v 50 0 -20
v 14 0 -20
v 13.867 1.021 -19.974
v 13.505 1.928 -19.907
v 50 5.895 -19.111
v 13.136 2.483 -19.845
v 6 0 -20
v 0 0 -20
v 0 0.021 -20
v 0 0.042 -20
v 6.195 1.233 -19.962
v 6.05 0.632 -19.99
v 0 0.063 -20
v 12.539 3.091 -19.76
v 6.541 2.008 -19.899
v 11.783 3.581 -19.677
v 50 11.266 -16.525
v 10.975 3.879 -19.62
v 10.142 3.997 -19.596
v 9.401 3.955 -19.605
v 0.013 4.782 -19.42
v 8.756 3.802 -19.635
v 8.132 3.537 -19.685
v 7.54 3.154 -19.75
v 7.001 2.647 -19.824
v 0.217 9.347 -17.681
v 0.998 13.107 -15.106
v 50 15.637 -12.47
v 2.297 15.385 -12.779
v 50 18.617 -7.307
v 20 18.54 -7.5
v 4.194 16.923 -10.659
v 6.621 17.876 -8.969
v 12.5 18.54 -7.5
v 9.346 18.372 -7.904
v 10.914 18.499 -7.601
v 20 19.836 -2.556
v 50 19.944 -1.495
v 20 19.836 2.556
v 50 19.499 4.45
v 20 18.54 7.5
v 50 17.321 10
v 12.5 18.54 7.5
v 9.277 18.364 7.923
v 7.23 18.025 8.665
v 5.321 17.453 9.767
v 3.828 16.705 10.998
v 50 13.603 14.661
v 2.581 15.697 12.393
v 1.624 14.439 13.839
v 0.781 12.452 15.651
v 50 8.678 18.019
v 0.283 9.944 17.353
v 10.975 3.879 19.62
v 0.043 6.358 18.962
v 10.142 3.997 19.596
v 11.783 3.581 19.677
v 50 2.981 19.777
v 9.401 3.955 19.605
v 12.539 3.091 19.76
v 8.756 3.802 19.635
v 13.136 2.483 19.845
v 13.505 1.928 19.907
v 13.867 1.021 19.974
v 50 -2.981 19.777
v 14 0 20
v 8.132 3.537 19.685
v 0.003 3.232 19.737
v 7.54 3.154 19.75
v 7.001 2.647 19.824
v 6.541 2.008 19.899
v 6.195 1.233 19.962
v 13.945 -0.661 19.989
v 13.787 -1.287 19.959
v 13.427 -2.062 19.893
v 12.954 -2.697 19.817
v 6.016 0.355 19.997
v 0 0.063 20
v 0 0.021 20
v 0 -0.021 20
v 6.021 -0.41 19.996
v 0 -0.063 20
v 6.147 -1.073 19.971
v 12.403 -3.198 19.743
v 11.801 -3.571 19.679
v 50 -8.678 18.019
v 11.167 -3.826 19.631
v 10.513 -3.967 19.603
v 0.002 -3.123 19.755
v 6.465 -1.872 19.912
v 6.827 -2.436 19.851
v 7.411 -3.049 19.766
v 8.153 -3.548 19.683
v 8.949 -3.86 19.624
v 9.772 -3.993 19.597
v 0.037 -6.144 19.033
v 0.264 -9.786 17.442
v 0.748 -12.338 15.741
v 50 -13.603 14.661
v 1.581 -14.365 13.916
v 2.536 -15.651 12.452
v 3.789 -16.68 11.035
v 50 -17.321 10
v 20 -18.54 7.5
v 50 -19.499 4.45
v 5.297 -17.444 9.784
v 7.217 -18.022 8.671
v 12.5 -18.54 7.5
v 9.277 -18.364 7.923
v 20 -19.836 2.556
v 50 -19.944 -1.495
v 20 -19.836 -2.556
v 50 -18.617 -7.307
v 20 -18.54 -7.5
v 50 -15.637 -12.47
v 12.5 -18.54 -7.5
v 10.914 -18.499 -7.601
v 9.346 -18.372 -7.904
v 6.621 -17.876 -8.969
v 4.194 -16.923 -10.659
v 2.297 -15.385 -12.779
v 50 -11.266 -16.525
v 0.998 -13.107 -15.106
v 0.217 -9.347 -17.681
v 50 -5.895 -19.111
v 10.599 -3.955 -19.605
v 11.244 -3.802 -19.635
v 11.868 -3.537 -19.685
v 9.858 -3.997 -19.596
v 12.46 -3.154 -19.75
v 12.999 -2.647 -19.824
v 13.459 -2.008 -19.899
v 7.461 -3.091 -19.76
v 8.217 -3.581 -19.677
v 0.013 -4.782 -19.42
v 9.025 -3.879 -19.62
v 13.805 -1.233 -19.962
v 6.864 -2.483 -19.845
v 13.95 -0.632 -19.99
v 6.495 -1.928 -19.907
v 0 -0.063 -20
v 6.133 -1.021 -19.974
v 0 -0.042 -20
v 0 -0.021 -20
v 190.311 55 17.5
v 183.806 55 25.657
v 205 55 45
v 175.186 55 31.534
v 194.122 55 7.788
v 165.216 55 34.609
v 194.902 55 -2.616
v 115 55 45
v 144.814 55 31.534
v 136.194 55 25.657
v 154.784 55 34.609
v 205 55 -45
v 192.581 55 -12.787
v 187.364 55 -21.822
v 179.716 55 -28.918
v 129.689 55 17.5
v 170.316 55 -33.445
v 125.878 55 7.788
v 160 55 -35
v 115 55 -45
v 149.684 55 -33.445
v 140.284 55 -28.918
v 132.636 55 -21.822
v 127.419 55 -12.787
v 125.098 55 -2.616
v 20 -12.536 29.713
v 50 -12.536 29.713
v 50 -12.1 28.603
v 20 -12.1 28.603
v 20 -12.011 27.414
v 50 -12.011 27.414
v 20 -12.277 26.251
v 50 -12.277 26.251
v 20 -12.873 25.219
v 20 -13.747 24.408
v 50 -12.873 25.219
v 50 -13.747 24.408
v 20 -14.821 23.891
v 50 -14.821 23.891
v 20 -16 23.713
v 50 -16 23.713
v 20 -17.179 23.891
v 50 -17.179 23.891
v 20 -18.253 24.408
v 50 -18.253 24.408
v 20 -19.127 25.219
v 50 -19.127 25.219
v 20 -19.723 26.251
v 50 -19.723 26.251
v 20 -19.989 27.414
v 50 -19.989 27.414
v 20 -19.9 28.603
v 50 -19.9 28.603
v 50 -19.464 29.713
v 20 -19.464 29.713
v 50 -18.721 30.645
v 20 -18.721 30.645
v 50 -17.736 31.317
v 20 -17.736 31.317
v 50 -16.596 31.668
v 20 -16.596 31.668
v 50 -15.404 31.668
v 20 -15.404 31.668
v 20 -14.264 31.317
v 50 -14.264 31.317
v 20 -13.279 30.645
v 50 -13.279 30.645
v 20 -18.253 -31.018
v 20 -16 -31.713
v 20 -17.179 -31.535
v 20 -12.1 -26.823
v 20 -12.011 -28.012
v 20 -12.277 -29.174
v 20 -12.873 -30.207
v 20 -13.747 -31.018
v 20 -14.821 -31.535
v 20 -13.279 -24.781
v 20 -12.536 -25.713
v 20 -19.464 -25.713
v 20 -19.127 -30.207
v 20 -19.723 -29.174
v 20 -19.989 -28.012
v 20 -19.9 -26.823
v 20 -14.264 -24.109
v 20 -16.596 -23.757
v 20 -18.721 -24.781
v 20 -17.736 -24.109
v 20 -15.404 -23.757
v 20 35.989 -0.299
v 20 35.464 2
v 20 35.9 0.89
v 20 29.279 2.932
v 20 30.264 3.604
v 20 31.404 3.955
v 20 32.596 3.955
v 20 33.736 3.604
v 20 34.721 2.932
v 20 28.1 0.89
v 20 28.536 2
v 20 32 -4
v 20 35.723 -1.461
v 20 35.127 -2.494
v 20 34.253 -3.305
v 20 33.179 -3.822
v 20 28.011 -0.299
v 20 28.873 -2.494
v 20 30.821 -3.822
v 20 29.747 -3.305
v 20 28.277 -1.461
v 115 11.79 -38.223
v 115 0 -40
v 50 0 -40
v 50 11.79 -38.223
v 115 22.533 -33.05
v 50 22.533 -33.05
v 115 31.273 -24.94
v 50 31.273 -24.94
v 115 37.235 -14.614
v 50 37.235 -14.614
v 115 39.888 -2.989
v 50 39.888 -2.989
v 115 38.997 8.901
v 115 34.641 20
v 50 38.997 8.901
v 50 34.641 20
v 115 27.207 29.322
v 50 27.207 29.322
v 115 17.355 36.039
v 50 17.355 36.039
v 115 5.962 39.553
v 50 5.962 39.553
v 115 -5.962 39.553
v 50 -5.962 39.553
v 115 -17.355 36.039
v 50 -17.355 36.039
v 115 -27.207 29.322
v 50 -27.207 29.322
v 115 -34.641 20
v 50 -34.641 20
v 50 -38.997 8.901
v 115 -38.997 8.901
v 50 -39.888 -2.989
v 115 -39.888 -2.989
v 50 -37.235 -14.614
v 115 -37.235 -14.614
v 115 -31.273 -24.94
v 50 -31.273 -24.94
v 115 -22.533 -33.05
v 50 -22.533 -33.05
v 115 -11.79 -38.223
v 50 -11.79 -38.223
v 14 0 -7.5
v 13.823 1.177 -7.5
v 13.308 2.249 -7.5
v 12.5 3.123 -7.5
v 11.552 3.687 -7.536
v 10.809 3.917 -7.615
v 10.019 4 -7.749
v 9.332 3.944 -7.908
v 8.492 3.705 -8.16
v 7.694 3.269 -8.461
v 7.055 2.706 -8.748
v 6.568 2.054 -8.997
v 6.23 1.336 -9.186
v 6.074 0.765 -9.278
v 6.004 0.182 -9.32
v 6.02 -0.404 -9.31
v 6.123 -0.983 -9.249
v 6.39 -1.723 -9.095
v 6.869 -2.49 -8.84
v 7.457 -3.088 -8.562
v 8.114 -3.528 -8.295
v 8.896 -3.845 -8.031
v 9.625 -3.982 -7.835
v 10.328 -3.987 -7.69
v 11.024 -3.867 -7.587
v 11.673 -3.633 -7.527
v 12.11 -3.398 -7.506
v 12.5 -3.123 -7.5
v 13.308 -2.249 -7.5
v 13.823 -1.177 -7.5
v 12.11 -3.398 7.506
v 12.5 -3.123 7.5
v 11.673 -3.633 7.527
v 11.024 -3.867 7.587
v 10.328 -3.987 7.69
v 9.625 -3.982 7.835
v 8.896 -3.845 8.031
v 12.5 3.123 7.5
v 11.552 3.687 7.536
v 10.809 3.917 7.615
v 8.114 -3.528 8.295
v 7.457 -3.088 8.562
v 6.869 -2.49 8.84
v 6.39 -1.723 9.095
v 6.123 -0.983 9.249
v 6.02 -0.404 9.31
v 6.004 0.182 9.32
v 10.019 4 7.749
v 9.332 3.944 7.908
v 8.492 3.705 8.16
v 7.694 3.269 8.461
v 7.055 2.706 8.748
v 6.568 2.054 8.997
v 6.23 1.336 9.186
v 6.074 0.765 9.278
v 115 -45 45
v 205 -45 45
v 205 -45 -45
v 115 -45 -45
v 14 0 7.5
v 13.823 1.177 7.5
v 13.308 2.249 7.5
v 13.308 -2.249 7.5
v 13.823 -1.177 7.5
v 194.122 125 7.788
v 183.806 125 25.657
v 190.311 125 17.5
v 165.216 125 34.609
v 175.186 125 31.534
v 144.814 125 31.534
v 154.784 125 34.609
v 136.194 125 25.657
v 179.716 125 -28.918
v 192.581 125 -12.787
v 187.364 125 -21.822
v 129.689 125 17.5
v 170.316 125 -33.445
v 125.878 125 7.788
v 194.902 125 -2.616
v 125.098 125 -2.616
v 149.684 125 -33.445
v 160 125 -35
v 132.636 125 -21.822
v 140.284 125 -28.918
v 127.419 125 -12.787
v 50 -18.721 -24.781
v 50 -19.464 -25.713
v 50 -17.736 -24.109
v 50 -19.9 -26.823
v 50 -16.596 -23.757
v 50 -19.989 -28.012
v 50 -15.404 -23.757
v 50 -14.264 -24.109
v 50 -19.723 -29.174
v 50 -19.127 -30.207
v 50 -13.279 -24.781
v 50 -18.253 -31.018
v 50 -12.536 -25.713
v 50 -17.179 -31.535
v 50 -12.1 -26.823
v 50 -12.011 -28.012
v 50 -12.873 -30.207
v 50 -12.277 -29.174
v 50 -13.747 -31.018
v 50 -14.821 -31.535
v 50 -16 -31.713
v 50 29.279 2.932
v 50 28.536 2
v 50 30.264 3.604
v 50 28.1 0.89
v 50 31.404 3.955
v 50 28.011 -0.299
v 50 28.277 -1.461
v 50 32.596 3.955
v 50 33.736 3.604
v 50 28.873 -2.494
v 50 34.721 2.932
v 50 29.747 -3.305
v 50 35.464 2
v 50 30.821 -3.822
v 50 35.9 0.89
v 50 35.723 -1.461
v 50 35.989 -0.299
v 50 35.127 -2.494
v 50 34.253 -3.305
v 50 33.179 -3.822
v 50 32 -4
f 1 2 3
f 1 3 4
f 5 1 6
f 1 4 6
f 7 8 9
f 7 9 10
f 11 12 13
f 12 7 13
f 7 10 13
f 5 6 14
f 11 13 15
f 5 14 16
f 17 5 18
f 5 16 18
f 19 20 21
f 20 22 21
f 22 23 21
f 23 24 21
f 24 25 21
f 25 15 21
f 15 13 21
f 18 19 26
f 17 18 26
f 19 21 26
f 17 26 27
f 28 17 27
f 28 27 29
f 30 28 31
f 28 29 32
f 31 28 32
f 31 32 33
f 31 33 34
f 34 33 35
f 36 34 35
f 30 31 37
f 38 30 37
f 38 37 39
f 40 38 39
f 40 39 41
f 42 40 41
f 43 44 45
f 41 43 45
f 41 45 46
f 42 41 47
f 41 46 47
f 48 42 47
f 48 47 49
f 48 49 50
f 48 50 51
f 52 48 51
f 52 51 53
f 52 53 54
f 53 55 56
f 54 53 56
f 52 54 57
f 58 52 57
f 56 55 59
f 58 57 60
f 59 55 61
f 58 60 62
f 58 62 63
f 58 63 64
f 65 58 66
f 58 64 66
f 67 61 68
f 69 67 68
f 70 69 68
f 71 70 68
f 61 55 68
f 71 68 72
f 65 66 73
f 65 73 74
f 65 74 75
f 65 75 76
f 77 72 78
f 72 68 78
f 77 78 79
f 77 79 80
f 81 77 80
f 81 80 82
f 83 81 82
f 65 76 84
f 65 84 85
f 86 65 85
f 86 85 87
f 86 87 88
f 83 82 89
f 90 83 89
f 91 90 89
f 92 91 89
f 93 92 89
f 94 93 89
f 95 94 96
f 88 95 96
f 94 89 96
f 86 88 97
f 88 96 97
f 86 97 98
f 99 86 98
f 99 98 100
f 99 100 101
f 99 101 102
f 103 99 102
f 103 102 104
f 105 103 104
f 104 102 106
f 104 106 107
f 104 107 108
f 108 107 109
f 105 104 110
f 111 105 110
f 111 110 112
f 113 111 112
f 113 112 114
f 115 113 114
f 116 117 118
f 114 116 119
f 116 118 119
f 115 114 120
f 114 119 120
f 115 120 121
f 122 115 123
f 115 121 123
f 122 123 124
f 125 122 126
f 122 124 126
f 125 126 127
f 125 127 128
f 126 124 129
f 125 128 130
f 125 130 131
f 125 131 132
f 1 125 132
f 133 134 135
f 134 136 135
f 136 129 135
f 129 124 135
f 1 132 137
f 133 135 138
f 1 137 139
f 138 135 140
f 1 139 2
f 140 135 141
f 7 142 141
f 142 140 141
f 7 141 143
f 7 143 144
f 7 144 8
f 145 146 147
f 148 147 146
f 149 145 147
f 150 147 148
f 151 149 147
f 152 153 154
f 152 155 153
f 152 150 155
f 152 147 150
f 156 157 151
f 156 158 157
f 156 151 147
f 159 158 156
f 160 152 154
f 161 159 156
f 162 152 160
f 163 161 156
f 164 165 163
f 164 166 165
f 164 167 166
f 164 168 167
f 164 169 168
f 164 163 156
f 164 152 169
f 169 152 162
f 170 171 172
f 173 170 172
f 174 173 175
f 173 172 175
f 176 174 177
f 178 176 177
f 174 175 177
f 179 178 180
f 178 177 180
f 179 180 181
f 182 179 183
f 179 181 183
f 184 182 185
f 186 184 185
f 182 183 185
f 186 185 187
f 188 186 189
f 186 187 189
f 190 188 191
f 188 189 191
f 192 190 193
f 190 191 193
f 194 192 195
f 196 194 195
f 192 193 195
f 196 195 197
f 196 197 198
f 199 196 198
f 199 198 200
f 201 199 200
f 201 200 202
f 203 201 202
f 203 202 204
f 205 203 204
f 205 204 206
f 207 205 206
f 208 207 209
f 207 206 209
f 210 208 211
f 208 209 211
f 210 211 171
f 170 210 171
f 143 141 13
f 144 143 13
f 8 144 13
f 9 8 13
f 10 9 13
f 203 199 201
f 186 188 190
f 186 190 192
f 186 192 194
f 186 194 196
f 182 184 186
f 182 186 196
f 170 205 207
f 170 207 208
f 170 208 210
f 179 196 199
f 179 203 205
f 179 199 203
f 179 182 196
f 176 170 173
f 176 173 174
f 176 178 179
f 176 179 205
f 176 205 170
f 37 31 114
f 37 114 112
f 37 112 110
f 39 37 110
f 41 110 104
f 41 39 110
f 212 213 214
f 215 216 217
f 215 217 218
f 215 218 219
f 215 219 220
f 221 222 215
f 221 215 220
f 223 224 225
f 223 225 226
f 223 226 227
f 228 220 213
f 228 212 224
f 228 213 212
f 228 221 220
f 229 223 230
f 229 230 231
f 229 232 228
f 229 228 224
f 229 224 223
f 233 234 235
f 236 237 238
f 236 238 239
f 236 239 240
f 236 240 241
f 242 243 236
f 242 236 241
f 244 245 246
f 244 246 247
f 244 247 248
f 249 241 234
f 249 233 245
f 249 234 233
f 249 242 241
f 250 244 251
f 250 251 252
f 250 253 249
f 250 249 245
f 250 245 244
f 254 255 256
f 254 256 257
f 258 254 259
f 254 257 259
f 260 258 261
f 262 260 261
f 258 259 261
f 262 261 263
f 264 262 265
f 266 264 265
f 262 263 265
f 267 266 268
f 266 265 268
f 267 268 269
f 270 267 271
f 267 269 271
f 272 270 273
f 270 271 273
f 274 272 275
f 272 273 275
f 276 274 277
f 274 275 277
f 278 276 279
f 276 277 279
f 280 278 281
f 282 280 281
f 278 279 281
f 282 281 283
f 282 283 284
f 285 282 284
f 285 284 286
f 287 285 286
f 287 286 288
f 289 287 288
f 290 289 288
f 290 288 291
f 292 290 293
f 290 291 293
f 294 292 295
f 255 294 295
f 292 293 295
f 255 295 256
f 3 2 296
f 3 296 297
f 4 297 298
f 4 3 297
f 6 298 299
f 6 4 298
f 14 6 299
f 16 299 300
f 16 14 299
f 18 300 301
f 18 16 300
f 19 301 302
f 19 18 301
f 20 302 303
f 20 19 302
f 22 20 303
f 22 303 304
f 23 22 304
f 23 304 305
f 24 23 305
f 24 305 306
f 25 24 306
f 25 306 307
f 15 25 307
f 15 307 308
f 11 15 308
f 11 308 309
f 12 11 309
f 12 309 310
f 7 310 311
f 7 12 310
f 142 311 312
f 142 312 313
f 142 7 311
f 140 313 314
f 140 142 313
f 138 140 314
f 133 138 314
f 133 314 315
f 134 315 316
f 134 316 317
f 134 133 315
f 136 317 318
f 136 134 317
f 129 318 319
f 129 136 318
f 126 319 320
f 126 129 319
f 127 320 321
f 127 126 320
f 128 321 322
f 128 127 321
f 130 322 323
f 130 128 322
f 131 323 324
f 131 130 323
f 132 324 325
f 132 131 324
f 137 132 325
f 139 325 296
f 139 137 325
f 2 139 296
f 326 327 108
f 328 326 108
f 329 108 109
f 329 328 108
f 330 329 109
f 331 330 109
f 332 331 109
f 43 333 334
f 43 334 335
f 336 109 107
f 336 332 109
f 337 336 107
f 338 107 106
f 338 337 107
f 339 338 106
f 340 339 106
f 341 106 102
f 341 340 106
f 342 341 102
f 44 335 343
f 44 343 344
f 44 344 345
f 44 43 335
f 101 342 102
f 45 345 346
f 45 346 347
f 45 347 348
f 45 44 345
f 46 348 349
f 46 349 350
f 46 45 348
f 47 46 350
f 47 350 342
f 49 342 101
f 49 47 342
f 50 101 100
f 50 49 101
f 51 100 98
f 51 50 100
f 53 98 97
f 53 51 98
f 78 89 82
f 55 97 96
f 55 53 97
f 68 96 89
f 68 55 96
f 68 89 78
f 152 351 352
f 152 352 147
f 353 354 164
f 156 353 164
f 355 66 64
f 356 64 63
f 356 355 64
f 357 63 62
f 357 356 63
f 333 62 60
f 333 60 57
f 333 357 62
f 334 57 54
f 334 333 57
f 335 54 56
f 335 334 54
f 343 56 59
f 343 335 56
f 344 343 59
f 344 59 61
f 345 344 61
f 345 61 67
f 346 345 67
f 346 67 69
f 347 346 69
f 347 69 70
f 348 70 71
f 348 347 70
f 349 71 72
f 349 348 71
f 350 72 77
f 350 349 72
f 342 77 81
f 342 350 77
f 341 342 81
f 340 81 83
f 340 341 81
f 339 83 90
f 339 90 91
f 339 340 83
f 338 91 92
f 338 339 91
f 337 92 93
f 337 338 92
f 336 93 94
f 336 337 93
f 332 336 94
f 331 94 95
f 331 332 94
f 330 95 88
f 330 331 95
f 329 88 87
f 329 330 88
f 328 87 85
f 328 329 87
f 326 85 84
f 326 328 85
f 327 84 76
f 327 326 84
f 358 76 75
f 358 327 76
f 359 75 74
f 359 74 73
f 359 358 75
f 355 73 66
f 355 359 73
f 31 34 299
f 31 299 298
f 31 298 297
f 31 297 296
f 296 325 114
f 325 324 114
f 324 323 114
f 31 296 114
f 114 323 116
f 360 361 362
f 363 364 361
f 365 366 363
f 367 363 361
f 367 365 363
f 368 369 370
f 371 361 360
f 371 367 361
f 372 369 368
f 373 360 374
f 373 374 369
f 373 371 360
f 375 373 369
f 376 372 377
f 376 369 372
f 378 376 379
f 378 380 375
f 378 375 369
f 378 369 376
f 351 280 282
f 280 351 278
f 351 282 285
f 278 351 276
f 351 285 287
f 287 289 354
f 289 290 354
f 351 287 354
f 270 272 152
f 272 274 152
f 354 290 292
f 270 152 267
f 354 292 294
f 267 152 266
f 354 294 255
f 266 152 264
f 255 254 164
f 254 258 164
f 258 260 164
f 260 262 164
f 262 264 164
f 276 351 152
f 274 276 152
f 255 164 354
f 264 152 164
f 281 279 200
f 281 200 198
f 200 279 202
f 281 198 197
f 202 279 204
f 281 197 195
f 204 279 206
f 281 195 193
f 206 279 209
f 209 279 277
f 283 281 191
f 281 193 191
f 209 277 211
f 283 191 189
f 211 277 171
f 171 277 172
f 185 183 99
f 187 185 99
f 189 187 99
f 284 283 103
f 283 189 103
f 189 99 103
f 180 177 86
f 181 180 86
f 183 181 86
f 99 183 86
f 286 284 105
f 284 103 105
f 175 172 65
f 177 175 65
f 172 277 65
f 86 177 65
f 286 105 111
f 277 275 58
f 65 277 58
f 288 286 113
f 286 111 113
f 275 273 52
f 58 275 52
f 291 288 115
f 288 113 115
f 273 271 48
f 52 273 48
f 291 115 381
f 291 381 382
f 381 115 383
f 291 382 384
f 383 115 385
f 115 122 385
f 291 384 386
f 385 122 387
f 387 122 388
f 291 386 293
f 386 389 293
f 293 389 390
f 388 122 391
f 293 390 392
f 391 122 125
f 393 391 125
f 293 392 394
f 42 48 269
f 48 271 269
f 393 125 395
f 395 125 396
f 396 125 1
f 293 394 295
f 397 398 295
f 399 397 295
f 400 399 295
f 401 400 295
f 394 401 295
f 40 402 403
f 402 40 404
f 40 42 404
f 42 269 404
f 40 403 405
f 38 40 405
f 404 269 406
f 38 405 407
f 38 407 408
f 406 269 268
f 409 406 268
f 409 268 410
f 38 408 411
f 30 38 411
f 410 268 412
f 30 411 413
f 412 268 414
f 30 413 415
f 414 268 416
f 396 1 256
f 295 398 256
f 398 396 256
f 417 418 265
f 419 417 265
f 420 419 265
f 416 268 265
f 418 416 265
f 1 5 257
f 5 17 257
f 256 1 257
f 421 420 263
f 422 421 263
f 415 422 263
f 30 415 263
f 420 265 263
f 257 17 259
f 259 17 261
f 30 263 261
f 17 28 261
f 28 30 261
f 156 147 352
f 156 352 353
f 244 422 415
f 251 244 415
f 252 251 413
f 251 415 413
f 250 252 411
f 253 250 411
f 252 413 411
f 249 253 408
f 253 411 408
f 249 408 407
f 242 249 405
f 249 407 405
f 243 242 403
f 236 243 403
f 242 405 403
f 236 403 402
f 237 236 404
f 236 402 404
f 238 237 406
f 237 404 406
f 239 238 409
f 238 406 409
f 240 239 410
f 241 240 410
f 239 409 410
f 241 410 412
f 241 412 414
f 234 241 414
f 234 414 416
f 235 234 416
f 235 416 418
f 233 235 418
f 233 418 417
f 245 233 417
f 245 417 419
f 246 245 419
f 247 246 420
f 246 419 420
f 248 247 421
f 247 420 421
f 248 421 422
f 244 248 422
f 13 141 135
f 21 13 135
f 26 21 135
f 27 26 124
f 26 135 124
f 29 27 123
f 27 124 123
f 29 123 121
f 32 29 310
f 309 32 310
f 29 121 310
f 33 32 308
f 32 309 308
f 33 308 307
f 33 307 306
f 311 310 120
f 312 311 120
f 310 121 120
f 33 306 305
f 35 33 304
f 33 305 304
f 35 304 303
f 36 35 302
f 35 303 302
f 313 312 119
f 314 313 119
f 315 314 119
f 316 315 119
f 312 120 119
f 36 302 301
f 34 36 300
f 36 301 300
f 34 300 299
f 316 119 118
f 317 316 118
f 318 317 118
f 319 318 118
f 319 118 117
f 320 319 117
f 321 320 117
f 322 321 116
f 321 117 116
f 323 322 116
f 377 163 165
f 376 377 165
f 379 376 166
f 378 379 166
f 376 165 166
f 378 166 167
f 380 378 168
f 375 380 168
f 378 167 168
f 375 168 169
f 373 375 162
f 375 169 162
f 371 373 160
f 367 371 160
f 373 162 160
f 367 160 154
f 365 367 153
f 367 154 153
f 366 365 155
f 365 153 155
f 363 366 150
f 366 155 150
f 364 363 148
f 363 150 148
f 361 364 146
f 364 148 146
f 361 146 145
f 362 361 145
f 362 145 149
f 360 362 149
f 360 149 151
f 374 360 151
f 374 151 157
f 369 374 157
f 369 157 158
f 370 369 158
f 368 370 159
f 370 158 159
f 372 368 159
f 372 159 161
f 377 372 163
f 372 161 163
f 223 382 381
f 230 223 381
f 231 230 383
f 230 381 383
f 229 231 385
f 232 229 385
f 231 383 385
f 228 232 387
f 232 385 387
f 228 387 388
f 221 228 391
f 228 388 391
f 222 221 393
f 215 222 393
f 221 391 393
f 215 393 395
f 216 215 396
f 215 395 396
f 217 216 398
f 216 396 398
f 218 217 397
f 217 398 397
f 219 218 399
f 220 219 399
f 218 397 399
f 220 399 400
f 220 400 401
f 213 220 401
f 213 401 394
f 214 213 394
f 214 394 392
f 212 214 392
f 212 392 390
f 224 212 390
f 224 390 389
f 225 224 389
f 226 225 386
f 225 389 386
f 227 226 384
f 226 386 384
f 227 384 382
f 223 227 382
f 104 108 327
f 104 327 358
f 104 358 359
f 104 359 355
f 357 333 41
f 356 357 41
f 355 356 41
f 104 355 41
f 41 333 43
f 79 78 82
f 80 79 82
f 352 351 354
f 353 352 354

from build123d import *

# Parameters (mm, degrees)
SKETCH2_R               = 20
BOSS_EXTRUDE2_DEPTH     = 50
CUT_EXTRUDE1_DEPTH      = 20
FILLET1_R               = 12.5
CUT_EXTRUDE2_DEPTH      = 61.466933273
CUT_EXTRUDE2_DEPTH_BACK = 61.466933273
SKETCH4_R               = 4
SKETCH5_R               = 40
BOSS_EXTRUDE3_DEPTH     = 65
SKETCH7_R               = 4
BOSS_EXTRUDE5_DEPTH     = 30
CIRPATTERN1_COUNT       = 3
SKETCH8_W               = 90
SKETCH8_H               = 100
BOSS_EXTRUDE6_DEPTH     = 90
SKETCH9_R               = 35
BOSS_EXTRUDE7_DEPTH     = 70


with BuildPart() as part:
    # Sketch2 → Boss-Extrude2 (new body)
    with BuildSketch(Plane(origin=(0, 0, 0), x_dir=(0, 0, -1), z_dir=(1, 0, 0))):
        Circle(SKETCH2_R)
    extrude(amount=BOSS_EXTRUDE2_DEPTH)

    # Sketch3 → Cut-Extrude1 (cut)
    with BuildSketch(Plane.ZY):
        with BuildLine():
            Line((-7.5, 18.540496218), (-7.5, -18.540496218))
            ThreePointArc((-7.5, -18.540496218), (0, -20), (7.5, -18.540496218))
            Line((7.5, -18.540496218), (7.5, 18.540496218))
            ThreePointArc((7.5, 18.540496218), (0, 20), (-7.5, 18.540496218))
        make_face()
    extrude(amount=-CUT_EXTRUDE1_DEPTH, mode=Mode.SUBTRACT)

    # Fillet1
    fillet1_edges = [part.edges().sort_by_distance(p)[0] for p in [
        (0, 0, 7.5),
        (0, 0, -7.5),
    ]]
    fillet(fillet1_edges, radius=FILLET1_R - 0.0001)  # a hair under: the kernel refuses the full size

    # Sketch4 → Cut-Extrude2 (cut, two sides: drawn at the far end of the back side and taken through both)
    with BuildSketch(Plane.XY.offset(-7.5).offset(-CUT_EXTRUDE2_DEPTH_BACK)):
        with Locations((10, 0)):
            Circle(SKETCH4_R)
    extrude(amount=CUT_EXTRUDE2_DEPTH + CUT_EXTRUDE2_DEPTH_BACK, mode=Mode.SUBTRACT)

    # Sketch5 → Boss-Extrude3 (add)
    with BuildSketch(Plane(origin=(50, 0, 0), x_dir=(0, 0, -1), z_dir=(1, 0, 0))):
        Circle(SKETCH5_R)
    extrude(amount=BOSS_EXTRUDE3_DEPTH)

    # Sketch7 → Boss-Extrude5 (add)
    with BuildSketch(Plane.ZY.offset(-50)):
        with Locations(Location((0, 32, 0), (0, 0, 180))):
            Circle(SKETCH7_R)
    boss_extrude5 = extrude(amount=BOSS_EXTRUDE5_DEPTH)

    # CirPattern1: Boss-Extrude5 ×3 about axis
    cirpattern1_axis = Axis((0, 0, 0), (1, 0, 0))
    for i in range(1, CIRPATTERN1_COUNT):
        add(boss_extrude5.rotate(cirpattern1_axis, i * 360 / CIRPATTERN1_COUNT))

    # Sketch8 → Boss-Extrude6 (add)
    with BuildSketch(Plane(origin=(115, 0, 0), x_dir=(0, 0, -1), z_dir=(1, 0, 0))):
        with Locations((0, 5)):
            Rectangle(SKETCH8_W, SKETCH8_H)
    extrude(amount=BOSS_EXTRUDE6_DEPTH)

    # Sketch9 → Boss-Extrude7 (add)
    with BuildSketch(Plane(origin=(0, 55, 0), x_dir=(1, 0, 0), z_dir=(0, 1, 0))):
        with Locations(Location((160, 0, 0), (0, 0, 90))):
            Circle(SKETCH9_R)
    extrude(amount=BOSS_EXTRUDE7_DEPTH)


solid = part.part
